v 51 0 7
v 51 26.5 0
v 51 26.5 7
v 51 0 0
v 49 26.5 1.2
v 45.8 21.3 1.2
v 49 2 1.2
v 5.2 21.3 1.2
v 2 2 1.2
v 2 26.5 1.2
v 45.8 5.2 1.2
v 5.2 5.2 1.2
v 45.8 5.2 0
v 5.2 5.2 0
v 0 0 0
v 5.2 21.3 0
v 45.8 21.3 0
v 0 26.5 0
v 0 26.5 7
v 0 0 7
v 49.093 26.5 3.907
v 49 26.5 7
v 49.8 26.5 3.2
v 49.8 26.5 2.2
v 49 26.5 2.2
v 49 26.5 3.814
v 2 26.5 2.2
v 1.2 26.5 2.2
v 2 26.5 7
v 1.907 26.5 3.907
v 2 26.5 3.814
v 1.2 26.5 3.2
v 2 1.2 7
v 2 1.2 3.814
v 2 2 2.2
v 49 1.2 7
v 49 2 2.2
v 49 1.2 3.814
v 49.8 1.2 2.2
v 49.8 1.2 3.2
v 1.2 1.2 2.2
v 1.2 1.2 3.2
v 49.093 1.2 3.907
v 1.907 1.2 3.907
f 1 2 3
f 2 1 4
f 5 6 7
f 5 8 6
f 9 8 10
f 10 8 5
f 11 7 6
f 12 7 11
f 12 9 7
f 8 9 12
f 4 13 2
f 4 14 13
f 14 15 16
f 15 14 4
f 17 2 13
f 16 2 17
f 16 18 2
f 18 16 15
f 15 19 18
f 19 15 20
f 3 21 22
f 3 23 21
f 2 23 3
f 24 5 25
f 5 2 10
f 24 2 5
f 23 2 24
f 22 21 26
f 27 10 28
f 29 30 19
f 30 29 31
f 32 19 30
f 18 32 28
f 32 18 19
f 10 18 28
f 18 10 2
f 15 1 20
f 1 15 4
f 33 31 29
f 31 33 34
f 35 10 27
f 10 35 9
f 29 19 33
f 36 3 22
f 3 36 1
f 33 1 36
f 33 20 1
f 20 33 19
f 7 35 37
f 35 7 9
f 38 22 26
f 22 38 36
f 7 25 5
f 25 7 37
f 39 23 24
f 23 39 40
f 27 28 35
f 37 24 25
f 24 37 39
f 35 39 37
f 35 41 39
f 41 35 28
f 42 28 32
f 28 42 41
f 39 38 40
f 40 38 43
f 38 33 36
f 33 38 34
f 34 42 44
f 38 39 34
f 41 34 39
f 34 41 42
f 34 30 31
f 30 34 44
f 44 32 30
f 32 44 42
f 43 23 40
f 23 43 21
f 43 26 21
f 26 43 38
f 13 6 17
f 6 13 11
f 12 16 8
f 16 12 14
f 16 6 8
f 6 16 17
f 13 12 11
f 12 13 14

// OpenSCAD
// for led power module modified

/* bluetooth_mate_holder.scad
 * By John Biehler - November 17, 2011
 * http://www.thingiverse.com/thing: 

 * derived from pcb_box_slide_with_tabs.scad
 * By Nicholas C Lewis - Jan 1, 2011
 * http://www.thingiverse.com/thing:5396 
 *
 * derived from pcb_box_slide.scad 
 *     Parametric, open PCB-box (slide-in) by chlunde
 *     http://www.thingiverse.com/thing:4071
 *
 * CHANGES
 * - adjusted to fit Arduino Mega
 * - added mounting tabs
 * - turned off cutouts
 * - adjusted bottom cutout size
 */

$fn=50;

//Uno is 2.7" x 2.1" which is 68.58 mm x 53.34 mm
//Round up to 69 mm x 54 mm
pcb_width = 48.6;
pcb_length =24.1;
pcb_height =1.0;
slisse = 0.8;

pcb_bottom_margin = 1;
wall_width_thick = 2;
wall_width = wall_width_thick-slisse;
box_height = 7;

//tab parameters
tab_hole_radius=2;
tab_outer_radius=4;

inner_margin = 4;

module pcb_led_cvf() {


  difference() {
    box();
    pcb();
    holes();
  }


}

module tab() {
	difference(){
		union() {
			translate([-tab_outer_radius,-tab_outer_radius,0])
			cube([tab_outer_radius,2*tab_outer_radius,wall_width]);
			translate([-tab_outer_radius,0,0])
				cylinder(r=tab_outer_radius, h = wall_width);
		}
		translate([-tab_outer_radius,0,0])
		 cylinder(r= tab_hole_radius, h = wall_width+3,center=true);
	}

}

module box() {
  union() {
    cube([pcb_width + 2*wall_width, pcb_length + 2*wall_width, wall_width]);

    cube([wall_width_thick, pcb_length + 2*wall_width, box_height]);

    cube([pcb_width + 2*wall_width, wall_width_thick, box_height]);

//    %translate([0, pcb_length+wall_width, 0])
//      cube([pcb_width + 2*wall_width,wall_width,box_height]);

    translate([pcb_width + wall_width - slisse,0,0])
      cube([wall_width_thick, pcb_length + 2*wall_width, box_height]);
  }
//comment out this part to remove tabs
 for(i=[(pcb_length + 2*wall_width)/2]){
//	translate([0,i,0])tab();
//	translate([pcb_width + 2*wall_width,i,0])mirror()tab();
 }


}

module pcb() {
  translate([wall_width, wall_width, wall_width + pcb_bottom_margin])
    cube([pcb_width,pcb_length + wall_width + 0.1,pcb_height]);
  translate([wall_width, wall_width, wall_width + pcb_bottom_margin+pcb_height])rotate([0,45,0])
    cube([pcb_height,pcb_length + wall_width + 0.1,pcb_height]);
  translate([wall_width+pcb_width-2*cos(45)*pcb_height, wall_width, wall_width + pcb_bottom_margin+pcb_height])rotate([0,45,0])
    cube([pcb_height,pcb_length + wall_width + 0.1,pcb_height]);
  translate([wall_width_thick, wall_width, wall_width + pcb_bottom_margin])
    cube([pcb_width-2*slisse,pcb_length + wall_width + 0.1,box_height]);

}



module holes() {
    *translate([wall_width + pcb_width/2, wall_width_thick + 0.1, pcb_width/2+wall_width])
      rotate(a=90,v=[1,0,0])
        cylinder(r=pcb_width/2, h=wall_width_thick + 0.2);
  
    *translate([-0.1, wall_width + pcb_length/2, pcb_length/2 + wall_width])
      rotate(a=90,v=[0,1,0])
        cylinder(r=pcb_length/2, h=wall_width_thick + 0.2);
  
    *translate([pcb_width + wall_width - slisse - 0.1, wall_width + pcb_length/2, pcb_length/2 + wall_width])
      rotate(a=90,v=[0,1,0])
        cylinder(r=pcb_length/2, h=wall_width_thick + 0.2);
  
   * translate([pcb_width/2 + wall_width, wall_width + pcb_length/2, -0.1])
      rotate(a=0,v=[0,1,0])
        cylinder(r=min(pcb_length,pcb_width)/2 - wall_width/2, h=wall_width_thick + 0.2);
     
    translate([inner_margin +wall_width, inner_margin+wall_width, -0.1])
      cube([pcb_width-inner_margin*2,pcb_length -inner_margin*2,wall_width + 0.2]);
}


pcb_led_cvf();
